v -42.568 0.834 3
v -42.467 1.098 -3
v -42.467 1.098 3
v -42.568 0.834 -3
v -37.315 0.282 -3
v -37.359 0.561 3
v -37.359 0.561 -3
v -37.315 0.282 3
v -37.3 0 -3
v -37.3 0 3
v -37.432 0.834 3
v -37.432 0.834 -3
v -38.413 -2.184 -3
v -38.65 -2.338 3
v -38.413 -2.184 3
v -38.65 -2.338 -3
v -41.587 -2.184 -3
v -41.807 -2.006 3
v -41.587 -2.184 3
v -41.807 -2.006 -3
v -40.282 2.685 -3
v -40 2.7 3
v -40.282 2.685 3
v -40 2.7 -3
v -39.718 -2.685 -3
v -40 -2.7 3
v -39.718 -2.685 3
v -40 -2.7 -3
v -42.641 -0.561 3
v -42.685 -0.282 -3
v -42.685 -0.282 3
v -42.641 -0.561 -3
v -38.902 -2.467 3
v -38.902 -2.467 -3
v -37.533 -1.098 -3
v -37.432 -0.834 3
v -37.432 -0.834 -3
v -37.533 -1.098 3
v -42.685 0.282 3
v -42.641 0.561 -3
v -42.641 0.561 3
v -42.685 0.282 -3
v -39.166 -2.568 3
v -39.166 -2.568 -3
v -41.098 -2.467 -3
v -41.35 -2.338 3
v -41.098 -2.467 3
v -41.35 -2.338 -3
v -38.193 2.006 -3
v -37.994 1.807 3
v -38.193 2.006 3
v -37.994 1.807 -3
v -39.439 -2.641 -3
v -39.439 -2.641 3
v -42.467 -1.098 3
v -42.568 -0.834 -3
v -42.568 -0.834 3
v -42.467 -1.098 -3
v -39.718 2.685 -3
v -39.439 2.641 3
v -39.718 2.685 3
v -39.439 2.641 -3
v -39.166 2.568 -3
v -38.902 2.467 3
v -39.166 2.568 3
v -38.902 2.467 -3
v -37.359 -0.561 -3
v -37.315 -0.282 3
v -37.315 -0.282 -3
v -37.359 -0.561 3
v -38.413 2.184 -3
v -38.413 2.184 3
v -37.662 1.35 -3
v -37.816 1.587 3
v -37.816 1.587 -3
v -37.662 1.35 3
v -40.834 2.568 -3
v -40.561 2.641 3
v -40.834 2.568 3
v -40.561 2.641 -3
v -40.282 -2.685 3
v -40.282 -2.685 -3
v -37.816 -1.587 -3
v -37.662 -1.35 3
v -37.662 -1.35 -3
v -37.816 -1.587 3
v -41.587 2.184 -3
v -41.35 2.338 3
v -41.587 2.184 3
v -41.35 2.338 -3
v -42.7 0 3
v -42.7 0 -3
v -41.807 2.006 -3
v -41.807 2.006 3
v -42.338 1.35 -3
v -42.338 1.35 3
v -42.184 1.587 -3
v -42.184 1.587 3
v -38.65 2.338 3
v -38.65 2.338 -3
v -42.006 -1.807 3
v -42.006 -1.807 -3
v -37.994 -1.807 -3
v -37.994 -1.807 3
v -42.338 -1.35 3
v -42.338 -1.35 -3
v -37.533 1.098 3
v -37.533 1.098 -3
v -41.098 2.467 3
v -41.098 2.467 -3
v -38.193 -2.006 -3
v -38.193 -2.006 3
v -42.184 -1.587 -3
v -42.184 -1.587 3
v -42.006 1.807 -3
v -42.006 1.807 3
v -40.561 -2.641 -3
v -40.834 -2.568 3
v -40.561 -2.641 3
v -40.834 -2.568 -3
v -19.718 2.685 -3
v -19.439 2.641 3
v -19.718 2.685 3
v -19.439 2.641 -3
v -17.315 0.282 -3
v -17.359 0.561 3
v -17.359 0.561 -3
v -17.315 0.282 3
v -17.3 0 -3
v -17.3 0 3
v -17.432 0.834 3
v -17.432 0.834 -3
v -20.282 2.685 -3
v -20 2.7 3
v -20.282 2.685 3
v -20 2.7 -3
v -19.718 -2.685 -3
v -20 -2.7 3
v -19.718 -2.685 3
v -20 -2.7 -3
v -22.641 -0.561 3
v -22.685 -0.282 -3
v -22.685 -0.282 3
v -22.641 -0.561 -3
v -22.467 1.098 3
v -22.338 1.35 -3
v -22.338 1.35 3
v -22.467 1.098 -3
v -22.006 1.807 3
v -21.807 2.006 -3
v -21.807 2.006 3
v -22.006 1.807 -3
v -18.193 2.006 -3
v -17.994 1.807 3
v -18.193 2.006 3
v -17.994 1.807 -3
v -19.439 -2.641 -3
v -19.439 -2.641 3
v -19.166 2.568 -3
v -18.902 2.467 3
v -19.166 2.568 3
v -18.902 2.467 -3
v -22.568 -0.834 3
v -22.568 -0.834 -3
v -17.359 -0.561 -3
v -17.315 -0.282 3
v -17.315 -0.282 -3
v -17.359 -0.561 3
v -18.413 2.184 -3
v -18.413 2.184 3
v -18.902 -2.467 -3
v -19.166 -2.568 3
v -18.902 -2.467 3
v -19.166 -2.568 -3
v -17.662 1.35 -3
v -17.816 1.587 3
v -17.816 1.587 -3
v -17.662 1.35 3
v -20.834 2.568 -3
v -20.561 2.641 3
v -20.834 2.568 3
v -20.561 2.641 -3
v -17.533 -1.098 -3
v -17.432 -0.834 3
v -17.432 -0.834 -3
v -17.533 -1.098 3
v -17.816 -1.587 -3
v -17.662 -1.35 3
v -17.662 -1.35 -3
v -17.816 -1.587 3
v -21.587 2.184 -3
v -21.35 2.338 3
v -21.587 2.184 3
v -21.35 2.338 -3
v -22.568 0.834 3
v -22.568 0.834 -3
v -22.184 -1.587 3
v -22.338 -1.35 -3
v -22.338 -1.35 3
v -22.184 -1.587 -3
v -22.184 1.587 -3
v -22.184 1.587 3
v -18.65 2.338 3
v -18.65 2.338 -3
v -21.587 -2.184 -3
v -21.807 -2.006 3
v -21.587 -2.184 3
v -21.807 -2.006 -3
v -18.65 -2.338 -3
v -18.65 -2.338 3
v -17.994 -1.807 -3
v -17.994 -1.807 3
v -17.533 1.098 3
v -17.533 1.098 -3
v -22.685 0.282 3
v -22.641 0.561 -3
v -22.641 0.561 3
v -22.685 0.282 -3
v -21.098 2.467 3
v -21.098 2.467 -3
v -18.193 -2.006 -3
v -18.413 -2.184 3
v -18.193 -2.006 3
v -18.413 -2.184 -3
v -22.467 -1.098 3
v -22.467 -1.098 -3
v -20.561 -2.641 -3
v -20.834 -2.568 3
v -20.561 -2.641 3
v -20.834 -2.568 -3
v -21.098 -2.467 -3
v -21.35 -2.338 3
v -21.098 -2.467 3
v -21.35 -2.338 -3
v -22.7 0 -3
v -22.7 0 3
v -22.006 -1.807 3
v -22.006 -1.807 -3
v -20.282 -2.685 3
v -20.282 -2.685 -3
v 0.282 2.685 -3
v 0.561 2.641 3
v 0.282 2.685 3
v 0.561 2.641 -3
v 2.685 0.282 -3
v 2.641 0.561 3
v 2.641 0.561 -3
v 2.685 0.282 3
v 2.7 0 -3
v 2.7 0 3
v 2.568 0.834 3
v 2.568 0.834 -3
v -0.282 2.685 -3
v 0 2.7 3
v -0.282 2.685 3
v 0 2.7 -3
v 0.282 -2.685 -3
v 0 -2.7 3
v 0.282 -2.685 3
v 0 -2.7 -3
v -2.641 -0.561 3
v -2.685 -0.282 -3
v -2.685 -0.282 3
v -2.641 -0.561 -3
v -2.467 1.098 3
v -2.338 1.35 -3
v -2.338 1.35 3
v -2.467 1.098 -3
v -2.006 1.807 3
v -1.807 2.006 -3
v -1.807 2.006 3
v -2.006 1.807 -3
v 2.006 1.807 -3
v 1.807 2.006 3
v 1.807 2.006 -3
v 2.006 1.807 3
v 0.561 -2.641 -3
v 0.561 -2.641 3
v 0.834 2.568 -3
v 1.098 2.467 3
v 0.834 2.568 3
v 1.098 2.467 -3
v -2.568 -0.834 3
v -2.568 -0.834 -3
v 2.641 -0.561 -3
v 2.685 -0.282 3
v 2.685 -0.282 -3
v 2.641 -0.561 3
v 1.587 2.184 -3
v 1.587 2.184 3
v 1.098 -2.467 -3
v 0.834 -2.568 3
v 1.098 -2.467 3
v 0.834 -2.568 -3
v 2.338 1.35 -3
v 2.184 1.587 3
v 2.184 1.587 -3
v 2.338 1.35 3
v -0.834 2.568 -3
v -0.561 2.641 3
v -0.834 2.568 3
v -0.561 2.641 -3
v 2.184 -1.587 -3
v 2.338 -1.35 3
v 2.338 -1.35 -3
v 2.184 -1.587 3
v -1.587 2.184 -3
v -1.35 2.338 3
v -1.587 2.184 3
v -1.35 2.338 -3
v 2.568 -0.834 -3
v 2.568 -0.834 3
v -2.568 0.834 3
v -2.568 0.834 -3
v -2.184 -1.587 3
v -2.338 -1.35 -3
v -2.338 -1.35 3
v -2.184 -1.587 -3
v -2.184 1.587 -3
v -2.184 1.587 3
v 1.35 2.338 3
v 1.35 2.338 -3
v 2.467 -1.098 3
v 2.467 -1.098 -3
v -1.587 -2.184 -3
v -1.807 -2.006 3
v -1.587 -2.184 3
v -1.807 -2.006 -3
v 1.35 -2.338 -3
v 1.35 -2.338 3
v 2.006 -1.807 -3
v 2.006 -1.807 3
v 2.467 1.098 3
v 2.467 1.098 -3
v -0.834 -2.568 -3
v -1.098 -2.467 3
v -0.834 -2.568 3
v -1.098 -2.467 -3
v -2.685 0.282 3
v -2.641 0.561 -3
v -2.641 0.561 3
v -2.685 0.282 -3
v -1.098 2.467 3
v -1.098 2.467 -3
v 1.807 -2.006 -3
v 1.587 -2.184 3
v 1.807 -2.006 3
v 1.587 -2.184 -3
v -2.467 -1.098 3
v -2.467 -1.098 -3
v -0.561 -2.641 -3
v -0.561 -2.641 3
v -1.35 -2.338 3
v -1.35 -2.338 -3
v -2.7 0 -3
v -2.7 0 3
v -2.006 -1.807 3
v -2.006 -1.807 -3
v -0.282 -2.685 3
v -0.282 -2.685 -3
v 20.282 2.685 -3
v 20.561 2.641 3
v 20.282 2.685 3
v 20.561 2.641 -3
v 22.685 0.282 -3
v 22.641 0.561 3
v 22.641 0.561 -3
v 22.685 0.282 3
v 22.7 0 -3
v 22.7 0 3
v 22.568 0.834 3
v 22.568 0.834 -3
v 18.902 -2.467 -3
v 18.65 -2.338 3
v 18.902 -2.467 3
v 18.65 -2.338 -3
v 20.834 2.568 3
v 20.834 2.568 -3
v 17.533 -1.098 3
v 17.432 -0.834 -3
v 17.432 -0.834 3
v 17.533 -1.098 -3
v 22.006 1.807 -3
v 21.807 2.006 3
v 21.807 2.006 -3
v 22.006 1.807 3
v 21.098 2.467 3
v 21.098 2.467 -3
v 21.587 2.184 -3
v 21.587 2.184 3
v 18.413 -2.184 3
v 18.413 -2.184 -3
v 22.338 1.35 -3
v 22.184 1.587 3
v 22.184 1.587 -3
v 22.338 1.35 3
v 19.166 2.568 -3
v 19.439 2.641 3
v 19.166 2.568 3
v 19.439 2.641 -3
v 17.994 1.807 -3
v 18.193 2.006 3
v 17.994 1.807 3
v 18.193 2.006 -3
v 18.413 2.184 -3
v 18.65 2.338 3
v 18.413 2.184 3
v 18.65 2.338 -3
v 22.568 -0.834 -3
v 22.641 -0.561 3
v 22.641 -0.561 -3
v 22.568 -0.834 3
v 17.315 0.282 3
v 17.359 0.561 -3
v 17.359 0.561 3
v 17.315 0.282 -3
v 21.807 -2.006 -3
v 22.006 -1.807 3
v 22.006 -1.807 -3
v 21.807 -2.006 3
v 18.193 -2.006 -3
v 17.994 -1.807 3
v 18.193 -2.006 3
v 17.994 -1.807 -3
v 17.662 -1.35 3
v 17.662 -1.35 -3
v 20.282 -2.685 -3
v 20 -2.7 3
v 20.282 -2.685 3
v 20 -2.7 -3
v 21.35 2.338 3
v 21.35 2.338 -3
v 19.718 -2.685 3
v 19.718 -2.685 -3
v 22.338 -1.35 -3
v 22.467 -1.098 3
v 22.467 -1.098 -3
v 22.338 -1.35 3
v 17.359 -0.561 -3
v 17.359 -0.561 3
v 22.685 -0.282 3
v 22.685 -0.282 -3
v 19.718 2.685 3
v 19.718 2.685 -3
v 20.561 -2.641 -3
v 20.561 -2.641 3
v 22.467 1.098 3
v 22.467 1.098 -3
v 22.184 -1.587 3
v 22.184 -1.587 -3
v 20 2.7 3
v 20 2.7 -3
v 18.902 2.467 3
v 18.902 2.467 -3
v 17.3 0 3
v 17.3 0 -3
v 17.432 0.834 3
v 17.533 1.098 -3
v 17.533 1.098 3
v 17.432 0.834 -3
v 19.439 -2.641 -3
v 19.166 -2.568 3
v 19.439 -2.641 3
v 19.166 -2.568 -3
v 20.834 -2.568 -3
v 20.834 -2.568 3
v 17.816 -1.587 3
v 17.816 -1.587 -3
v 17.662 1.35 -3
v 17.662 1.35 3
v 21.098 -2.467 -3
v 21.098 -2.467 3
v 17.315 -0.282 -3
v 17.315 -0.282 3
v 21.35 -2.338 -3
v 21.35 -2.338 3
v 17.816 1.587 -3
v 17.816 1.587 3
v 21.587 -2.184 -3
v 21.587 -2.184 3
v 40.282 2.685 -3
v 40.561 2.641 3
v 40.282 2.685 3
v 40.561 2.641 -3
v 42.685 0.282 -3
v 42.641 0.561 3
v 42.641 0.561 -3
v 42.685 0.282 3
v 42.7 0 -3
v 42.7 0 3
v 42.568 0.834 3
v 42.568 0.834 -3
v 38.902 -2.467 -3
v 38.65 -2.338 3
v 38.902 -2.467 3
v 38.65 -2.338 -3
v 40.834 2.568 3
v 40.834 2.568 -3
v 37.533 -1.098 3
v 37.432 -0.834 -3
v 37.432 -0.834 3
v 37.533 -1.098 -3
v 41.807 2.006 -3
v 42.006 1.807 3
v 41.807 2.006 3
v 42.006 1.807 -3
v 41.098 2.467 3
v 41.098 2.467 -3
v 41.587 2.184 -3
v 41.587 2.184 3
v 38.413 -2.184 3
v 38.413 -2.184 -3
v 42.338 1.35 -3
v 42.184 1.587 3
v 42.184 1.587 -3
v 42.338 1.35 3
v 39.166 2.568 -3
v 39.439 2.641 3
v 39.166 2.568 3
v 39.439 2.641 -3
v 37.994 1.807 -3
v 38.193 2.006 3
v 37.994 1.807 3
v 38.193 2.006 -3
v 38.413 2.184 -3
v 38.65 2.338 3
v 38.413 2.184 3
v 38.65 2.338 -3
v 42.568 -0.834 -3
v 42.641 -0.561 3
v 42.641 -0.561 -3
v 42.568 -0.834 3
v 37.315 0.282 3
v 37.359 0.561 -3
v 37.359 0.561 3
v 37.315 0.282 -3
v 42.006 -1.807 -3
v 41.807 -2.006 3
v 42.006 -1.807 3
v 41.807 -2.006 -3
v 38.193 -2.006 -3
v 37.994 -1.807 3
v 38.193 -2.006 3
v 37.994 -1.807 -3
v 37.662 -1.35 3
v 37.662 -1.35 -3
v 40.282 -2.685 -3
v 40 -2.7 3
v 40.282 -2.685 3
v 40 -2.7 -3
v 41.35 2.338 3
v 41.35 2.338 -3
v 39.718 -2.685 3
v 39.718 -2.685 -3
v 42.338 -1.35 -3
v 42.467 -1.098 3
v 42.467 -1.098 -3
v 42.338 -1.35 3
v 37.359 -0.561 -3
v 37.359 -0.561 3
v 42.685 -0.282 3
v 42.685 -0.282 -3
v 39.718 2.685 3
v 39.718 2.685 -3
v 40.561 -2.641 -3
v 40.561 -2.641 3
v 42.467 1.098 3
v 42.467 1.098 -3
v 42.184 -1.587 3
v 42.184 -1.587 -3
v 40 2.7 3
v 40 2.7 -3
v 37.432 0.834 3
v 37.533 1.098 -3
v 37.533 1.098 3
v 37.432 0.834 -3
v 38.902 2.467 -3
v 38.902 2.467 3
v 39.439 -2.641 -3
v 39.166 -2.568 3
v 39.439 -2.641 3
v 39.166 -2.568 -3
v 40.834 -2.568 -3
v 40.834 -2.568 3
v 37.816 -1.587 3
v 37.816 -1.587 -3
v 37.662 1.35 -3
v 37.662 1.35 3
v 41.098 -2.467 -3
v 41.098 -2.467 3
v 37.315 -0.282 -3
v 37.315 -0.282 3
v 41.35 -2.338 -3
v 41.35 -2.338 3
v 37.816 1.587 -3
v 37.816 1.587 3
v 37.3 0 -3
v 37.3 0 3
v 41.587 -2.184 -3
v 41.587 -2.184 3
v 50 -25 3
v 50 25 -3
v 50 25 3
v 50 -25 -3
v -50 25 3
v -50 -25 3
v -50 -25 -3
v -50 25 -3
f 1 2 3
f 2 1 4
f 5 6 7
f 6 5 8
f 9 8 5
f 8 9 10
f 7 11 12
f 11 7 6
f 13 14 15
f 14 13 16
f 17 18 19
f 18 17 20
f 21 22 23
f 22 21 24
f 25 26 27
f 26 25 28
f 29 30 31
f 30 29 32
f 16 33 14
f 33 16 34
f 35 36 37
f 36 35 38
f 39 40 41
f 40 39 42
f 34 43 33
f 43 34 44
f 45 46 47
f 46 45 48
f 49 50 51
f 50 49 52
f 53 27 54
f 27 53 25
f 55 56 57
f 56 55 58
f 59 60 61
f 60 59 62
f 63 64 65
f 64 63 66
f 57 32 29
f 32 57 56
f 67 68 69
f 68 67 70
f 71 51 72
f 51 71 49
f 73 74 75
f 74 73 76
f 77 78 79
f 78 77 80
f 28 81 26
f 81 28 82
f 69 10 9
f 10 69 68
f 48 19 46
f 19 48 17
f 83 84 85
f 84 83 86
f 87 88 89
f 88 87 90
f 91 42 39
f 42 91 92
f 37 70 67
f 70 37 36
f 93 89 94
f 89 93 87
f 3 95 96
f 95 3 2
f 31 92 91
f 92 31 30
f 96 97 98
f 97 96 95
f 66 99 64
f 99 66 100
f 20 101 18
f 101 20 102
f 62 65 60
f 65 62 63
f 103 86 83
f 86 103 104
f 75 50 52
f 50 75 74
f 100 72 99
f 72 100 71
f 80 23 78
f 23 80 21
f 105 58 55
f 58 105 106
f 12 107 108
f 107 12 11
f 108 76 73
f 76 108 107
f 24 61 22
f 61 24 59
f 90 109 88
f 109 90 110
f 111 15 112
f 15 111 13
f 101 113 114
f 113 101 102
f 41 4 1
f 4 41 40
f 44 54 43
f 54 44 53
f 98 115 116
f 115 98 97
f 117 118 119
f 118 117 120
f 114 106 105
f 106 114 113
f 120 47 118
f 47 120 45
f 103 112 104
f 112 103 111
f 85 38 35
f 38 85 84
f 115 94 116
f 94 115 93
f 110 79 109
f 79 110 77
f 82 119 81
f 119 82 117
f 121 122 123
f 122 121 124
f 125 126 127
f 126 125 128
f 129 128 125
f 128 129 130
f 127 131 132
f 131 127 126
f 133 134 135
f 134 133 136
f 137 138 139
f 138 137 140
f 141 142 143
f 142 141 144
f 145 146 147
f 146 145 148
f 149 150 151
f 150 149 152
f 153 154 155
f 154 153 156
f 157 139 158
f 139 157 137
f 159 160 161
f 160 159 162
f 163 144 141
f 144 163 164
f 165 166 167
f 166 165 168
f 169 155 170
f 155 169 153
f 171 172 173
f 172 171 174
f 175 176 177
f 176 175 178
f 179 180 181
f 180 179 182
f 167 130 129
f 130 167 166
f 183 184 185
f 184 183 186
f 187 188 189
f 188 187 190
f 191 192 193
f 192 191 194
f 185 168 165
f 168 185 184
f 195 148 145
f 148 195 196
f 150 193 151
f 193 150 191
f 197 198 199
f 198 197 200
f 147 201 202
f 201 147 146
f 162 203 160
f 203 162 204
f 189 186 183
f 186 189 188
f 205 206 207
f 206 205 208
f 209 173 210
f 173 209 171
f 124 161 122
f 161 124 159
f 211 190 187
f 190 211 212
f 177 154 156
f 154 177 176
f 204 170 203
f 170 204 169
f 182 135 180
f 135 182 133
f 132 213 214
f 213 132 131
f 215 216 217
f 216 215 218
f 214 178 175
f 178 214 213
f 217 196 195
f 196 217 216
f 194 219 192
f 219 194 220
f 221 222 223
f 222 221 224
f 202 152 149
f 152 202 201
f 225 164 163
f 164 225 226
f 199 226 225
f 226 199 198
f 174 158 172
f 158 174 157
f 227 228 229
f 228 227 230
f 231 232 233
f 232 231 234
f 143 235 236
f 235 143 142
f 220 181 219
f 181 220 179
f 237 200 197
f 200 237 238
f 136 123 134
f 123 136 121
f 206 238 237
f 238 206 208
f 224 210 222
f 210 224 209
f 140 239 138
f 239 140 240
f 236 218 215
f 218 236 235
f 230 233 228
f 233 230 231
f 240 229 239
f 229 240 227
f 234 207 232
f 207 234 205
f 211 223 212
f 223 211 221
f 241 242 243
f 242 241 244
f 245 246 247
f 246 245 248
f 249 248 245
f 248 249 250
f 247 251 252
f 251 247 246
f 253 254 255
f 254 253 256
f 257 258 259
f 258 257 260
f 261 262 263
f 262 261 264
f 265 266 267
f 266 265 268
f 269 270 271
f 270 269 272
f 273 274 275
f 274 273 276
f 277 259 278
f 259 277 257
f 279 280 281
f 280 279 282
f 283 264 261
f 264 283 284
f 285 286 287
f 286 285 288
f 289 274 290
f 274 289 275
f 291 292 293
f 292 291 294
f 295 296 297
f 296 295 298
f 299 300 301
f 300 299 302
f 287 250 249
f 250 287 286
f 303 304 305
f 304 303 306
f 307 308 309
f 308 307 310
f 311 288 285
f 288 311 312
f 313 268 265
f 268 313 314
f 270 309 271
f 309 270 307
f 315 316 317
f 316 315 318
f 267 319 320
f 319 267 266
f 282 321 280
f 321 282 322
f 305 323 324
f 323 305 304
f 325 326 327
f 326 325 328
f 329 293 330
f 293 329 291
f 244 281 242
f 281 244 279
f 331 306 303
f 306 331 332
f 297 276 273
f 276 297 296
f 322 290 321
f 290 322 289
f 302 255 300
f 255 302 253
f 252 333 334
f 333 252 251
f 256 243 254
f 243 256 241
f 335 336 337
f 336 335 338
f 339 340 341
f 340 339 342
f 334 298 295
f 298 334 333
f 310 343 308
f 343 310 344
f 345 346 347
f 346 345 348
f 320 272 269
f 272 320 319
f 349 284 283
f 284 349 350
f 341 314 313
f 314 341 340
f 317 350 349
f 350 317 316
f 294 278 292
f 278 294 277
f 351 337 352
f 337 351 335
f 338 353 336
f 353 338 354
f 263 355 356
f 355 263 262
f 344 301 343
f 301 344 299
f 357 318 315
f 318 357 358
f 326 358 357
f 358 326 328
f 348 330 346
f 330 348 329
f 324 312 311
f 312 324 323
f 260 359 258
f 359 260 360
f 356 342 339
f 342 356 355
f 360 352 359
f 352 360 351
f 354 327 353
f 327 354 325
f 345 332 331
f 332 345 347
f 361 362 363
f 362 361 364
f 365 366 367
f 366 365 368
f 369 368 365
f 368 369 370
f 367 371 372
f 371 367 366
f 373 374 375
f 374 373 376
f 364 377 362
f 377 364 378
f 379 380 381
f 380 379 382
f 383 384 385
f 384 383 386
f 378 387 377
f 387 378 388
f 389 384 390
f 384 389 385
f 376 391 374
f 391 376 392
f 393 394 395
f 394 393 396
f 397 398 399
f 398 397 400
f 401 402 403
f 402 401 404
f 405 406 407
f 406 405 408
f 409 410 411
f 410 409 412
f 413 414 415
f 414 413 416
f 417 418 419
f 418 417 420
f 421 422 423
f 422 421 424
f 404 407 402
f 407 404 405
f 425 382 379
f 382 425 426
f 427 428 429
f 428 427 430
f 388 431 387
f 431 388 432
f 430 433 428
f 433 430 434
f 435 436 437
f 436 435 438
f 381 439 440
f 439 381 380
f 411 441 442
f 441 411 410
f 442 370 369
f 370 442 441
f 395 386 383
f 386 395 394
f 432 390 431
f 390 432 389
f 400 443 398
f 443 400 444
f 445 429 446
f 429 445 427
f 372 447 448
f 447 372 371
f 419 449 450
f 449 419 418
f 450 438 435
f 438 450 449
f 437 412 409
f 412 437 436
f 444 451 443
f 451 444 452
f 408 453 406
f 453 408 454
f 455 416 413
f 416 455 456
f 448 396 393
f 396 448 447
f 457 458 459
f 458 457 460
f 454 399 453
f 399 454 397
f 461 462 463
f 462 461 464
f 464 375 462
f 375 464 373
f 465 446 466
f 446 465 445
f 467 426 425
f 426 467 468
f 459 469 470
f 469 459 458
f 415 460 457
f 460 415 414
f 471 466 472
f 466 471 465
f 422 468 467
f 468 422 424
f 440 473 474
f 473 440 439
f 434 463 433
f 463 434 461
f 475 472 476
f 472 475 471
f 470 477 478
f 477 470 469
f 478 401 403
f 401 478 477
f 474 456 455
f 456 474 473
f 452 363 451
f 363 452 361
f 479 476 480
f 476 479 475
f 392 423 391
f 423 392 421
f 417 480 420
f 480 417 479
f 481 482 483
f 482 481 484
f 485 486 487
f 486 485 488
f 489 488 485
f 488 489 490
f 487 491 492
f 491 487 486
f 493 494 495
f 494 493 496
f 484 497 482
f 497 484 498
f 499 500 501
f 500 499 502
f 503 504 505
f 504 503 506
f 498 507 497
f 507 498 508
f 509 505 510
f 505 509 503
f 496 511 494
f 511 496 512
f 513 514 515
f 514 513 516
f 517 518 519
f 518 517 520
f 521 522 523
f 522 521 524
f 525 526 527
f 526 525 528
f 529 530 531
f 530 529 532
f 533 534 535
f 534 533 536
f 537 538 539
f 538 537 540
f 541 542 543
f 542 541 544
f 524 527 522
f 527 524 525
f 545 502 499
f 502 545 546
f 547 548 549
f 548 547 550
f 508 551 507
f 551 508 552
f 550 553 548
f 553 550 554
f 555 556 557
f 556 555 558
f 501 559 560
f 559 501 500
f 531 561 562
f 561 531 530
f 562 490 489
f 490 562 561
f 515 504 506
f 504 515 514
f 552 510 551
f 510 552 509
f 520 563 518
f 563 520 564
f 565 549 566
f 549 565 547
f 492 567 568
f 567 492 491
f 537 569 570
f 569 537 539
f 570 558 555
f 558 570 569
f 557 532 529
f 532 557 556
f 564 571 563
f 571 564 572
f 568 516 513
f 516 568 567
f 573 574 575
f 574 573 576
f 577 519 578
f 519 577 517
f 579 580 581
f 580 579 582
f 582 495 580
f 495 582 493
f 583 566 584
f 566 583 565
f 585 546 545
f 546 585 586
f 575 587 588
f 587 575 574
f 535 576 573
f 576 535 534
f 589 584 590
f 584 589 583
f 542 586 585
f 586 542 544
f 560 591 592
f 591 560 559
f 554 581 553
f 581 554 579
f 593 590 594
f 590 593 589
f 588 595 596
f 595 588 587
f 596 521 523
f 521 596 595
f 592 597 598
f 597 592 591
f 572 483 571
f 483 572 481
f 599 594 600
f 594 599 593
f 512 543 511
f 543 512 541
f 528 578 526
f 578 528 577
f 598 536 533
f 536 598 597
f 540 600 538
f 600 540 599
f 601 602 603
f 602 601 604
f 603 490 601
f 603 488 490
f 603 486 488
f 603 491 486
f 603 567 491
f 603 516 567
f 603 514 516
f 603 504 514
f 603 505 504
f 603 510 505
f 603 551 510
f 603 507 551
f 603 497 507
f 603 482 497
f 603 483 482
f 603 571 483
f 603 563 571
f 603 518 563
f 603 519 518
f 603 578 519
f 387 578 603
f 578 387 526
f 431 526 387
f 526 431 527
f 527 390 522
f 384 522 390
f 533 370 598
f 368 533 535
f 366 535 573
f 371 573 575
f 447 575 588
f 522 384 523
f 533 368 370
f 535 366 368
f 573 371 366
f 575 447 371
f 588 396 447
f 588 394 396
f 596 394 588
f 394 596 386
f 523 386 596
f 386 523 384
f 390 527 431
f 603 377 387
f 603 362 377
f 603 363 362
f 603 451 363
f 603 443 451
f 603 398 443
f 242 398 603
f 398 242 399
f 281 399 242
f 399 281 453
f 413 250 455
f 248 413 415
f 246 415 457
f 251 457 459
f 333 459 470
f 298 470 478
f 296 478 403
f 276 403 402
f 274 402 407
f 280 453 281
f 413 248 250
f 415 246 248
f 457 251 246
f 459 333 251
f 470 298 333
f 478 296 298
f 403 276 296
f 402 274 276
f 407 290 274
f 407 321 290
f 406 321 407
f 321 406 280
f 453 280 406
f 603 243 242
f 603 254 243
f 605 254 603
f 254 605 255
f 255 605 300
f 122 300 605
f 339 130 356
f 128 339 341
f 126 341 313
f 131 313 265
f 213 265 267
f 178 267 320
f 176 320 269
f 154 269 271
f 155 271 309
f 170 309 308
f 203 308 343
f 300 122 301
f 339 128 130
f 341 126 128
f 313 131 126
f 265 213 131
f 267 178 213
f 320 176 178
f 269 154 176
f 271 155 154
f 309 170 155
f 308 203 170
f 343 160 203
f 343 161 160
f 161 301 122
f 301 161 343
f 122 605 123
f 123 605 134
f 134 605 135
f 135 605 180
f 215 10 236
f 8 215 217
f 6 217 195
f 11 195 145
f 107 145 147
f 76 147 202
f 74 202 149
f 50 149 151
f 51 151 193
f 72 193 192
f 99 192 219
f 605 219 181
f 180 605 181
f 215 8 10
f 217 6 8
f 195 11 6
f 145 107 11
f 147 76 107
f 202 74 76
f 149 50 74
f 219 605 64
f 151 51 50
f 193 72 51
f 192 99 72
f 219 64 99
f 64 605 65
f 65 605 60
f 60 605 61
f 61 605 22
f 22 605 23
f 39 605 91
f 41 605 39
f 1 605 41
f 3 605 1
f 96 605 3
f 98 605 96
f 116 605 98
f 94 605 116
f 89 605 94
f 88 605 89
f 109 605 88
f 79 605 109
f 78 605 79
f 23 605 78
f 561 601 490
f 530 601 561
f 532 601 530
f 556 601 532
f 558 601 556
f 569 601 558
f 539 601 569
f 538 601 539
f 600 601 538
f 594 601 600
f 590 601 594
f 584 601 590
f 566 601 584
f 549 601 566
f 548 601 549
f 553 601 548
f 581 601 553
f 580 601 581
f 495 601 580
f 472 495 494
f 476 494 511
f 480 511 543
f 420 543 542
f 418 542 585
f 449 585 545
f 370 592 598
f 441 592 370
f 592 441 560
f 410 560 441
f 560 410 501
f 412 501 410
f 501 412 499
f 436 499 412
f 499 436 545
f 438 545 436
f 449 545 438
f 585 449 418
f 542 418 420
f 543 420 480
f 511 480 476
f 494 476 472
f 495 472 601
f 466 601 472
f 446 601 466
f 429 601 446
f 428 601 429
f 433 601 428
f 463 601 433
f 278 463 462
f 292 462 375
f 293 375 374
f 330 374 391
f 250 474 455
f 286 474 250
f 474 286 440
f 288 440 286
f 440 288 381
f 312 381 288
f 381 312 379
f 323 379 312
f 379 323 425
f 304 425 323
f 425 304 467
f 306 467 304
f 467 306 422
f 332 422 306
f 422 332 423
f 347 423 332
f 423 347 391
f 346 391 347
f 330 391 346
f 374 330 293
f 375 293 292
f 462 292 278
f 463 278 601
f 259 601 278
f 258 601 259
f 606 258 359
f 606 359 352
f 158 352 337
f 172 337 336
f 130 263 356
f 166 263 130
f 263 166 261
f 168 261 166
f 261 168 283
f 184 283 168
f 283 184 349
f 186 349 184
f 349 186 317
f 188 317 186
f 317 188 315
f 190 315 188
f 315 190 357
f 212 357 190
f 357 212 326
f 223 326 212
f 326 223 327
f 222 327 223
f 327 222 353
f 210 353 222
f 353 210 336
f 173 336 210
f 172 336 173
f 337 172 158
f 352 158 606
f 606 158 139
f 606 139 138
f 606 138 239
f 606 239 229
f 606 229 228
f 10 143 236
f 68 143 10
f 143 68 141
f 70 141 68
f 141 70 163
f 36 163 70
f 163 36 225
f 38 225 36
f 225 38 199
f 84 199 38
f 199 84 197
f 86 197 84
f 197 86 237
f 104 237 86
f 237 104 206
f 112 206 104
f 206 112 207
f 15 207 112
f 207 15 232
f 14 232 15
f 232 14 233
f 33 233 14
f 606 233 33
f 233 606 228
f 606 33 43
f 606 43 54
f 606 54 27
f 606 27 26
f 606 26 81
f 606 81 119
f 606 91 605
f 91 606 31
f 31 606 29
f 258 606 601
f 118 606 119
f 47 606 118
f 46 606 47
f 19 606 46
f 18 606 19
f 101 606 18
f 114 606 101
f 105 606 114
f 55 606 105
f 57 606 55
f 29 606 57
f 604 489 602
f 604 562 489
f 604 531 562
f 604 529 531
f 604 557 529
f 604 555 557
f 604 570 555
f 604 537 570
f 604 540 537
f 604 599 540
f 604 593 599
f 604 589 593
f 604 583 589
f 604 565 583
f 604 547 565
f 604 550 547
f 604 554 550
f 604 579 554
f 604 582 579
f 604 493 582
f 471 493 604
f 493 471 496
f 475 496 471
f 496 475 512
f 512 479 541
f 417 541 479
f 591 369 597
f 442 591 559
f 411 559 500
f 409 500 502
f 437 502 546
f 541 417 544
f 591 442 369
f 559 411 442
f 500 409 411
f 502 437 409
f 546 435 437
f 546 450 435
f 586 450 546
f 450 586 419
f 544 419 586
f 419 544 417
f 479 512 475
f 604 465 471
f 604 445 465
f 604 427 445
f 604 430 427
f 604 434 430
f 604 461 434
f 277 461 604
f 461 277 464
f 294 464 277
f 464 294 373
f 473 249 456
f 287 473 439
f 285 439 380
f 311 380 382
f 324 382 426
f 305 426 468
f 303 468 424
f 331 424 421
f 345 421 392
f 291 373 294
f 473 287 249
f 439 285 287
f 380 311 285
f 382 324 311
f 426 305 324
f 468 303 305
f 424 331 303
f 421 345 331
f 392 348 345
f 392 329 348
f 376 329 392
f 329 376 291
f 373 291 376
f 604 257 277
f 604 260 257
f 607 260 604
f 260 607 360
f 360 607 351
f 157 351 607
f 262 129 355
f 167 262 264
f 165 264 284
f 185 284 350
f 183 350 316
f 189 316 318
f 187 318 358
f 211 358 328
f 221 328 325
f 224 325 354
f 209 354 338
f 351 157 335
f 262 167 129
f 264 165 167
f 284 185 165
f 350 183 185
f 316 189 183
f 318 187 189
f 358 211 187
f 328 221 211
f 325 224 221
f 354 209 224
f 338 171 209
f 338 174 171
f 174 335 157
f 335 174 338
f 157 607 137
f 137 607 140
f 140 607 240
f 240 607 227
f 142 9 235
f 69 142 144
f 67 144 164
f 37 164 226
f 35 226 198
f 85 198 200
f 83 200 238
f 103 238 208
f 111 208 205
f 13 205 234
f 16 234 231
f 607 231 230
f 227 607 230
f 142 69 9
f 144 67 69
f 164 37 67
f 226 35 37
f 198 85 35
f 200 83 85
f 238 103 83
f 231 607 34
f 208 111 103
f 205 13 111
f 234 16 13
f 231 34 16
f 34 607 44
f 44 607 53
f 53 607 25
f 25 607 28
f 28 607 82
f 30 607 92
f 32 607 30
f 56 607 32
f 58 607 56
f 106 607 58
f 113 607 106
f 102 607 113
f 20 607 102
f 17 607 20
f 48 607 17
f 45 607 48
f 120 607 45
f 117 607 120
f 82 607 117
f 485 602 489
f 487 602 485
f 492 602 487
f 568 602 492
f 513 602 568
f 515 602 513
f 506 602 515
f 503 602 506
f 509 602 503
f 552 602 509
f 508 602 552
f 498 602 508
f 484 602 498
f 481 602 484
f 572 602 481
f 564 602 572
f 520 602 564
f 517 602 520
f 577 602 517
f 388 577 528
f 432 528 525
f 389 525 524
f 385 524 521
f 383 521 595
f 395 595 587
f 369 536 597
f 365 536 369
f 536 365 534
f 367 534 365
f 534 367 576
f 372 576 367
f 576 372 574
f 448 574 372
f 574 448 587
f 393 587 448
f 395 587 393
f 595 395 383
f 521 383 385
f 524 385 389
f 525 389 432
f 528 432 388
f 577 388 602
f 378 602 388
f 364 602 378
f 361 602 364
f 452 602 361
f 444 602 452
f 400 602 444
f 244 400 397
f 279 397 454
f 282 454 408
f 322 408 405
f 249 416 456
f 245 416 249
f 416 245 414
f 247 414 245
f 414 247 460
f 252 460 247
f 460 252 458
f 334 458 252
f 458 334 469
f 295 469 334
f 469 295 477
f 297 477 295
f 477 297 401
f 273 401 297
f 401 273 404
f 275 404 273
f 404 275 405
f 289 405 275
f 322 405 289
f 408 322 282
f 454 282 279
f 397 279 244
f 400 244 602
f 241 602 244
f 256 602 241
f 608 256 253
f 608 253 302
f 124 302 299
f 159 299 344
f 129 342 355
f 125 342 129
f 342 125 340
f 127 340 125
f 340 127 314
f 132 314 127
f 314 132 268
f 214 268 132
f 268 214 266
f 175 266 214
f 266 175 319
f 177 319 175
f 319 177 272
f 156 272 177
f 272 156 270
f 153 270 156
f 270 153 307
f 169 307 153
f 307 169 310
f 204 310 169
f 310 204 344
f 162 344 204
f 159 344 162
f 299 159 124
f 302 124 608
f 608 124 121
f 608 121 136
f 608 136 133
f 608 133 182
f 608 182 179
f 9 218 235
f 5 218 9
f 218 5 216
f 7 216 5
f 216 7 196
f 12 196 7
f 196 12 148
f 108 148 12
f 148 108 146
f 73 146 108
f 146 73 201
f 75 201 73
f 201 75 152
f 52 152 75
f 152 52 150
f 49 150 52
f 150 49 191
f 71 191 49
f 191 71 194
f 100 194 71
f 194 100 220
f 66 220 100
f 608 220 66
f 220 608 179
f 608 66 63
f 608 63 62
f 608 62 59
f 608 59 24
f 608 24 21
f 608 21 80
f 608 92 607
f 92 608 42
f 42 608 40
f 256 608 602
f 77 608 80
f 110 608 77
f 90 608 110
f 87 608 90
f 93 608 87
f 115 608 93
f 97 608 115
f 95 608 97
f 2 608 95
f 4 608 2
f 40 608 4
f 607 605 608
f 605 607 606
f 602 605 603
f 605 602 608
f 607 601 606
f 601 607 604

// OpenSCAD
// Multi-hole mounting plate.
$fn = 60;
eps = 0.02;
plate_l = 100;
plate_w = 50;
plate_t = 6;
hole_d = 5.4;
edge = 10;
difference() {
    cube([plate_l, plate_w, plate_t], center = true);
    for (i = [0 : 4])
        translate([-plate_l / 2 + edge + i * (plate_l - 2 * edge) / max(1, 4), 0, -plate_t / 2 - eps])
            cylinder(d = hole_d, h = plate_t + 2 * eps);
}
